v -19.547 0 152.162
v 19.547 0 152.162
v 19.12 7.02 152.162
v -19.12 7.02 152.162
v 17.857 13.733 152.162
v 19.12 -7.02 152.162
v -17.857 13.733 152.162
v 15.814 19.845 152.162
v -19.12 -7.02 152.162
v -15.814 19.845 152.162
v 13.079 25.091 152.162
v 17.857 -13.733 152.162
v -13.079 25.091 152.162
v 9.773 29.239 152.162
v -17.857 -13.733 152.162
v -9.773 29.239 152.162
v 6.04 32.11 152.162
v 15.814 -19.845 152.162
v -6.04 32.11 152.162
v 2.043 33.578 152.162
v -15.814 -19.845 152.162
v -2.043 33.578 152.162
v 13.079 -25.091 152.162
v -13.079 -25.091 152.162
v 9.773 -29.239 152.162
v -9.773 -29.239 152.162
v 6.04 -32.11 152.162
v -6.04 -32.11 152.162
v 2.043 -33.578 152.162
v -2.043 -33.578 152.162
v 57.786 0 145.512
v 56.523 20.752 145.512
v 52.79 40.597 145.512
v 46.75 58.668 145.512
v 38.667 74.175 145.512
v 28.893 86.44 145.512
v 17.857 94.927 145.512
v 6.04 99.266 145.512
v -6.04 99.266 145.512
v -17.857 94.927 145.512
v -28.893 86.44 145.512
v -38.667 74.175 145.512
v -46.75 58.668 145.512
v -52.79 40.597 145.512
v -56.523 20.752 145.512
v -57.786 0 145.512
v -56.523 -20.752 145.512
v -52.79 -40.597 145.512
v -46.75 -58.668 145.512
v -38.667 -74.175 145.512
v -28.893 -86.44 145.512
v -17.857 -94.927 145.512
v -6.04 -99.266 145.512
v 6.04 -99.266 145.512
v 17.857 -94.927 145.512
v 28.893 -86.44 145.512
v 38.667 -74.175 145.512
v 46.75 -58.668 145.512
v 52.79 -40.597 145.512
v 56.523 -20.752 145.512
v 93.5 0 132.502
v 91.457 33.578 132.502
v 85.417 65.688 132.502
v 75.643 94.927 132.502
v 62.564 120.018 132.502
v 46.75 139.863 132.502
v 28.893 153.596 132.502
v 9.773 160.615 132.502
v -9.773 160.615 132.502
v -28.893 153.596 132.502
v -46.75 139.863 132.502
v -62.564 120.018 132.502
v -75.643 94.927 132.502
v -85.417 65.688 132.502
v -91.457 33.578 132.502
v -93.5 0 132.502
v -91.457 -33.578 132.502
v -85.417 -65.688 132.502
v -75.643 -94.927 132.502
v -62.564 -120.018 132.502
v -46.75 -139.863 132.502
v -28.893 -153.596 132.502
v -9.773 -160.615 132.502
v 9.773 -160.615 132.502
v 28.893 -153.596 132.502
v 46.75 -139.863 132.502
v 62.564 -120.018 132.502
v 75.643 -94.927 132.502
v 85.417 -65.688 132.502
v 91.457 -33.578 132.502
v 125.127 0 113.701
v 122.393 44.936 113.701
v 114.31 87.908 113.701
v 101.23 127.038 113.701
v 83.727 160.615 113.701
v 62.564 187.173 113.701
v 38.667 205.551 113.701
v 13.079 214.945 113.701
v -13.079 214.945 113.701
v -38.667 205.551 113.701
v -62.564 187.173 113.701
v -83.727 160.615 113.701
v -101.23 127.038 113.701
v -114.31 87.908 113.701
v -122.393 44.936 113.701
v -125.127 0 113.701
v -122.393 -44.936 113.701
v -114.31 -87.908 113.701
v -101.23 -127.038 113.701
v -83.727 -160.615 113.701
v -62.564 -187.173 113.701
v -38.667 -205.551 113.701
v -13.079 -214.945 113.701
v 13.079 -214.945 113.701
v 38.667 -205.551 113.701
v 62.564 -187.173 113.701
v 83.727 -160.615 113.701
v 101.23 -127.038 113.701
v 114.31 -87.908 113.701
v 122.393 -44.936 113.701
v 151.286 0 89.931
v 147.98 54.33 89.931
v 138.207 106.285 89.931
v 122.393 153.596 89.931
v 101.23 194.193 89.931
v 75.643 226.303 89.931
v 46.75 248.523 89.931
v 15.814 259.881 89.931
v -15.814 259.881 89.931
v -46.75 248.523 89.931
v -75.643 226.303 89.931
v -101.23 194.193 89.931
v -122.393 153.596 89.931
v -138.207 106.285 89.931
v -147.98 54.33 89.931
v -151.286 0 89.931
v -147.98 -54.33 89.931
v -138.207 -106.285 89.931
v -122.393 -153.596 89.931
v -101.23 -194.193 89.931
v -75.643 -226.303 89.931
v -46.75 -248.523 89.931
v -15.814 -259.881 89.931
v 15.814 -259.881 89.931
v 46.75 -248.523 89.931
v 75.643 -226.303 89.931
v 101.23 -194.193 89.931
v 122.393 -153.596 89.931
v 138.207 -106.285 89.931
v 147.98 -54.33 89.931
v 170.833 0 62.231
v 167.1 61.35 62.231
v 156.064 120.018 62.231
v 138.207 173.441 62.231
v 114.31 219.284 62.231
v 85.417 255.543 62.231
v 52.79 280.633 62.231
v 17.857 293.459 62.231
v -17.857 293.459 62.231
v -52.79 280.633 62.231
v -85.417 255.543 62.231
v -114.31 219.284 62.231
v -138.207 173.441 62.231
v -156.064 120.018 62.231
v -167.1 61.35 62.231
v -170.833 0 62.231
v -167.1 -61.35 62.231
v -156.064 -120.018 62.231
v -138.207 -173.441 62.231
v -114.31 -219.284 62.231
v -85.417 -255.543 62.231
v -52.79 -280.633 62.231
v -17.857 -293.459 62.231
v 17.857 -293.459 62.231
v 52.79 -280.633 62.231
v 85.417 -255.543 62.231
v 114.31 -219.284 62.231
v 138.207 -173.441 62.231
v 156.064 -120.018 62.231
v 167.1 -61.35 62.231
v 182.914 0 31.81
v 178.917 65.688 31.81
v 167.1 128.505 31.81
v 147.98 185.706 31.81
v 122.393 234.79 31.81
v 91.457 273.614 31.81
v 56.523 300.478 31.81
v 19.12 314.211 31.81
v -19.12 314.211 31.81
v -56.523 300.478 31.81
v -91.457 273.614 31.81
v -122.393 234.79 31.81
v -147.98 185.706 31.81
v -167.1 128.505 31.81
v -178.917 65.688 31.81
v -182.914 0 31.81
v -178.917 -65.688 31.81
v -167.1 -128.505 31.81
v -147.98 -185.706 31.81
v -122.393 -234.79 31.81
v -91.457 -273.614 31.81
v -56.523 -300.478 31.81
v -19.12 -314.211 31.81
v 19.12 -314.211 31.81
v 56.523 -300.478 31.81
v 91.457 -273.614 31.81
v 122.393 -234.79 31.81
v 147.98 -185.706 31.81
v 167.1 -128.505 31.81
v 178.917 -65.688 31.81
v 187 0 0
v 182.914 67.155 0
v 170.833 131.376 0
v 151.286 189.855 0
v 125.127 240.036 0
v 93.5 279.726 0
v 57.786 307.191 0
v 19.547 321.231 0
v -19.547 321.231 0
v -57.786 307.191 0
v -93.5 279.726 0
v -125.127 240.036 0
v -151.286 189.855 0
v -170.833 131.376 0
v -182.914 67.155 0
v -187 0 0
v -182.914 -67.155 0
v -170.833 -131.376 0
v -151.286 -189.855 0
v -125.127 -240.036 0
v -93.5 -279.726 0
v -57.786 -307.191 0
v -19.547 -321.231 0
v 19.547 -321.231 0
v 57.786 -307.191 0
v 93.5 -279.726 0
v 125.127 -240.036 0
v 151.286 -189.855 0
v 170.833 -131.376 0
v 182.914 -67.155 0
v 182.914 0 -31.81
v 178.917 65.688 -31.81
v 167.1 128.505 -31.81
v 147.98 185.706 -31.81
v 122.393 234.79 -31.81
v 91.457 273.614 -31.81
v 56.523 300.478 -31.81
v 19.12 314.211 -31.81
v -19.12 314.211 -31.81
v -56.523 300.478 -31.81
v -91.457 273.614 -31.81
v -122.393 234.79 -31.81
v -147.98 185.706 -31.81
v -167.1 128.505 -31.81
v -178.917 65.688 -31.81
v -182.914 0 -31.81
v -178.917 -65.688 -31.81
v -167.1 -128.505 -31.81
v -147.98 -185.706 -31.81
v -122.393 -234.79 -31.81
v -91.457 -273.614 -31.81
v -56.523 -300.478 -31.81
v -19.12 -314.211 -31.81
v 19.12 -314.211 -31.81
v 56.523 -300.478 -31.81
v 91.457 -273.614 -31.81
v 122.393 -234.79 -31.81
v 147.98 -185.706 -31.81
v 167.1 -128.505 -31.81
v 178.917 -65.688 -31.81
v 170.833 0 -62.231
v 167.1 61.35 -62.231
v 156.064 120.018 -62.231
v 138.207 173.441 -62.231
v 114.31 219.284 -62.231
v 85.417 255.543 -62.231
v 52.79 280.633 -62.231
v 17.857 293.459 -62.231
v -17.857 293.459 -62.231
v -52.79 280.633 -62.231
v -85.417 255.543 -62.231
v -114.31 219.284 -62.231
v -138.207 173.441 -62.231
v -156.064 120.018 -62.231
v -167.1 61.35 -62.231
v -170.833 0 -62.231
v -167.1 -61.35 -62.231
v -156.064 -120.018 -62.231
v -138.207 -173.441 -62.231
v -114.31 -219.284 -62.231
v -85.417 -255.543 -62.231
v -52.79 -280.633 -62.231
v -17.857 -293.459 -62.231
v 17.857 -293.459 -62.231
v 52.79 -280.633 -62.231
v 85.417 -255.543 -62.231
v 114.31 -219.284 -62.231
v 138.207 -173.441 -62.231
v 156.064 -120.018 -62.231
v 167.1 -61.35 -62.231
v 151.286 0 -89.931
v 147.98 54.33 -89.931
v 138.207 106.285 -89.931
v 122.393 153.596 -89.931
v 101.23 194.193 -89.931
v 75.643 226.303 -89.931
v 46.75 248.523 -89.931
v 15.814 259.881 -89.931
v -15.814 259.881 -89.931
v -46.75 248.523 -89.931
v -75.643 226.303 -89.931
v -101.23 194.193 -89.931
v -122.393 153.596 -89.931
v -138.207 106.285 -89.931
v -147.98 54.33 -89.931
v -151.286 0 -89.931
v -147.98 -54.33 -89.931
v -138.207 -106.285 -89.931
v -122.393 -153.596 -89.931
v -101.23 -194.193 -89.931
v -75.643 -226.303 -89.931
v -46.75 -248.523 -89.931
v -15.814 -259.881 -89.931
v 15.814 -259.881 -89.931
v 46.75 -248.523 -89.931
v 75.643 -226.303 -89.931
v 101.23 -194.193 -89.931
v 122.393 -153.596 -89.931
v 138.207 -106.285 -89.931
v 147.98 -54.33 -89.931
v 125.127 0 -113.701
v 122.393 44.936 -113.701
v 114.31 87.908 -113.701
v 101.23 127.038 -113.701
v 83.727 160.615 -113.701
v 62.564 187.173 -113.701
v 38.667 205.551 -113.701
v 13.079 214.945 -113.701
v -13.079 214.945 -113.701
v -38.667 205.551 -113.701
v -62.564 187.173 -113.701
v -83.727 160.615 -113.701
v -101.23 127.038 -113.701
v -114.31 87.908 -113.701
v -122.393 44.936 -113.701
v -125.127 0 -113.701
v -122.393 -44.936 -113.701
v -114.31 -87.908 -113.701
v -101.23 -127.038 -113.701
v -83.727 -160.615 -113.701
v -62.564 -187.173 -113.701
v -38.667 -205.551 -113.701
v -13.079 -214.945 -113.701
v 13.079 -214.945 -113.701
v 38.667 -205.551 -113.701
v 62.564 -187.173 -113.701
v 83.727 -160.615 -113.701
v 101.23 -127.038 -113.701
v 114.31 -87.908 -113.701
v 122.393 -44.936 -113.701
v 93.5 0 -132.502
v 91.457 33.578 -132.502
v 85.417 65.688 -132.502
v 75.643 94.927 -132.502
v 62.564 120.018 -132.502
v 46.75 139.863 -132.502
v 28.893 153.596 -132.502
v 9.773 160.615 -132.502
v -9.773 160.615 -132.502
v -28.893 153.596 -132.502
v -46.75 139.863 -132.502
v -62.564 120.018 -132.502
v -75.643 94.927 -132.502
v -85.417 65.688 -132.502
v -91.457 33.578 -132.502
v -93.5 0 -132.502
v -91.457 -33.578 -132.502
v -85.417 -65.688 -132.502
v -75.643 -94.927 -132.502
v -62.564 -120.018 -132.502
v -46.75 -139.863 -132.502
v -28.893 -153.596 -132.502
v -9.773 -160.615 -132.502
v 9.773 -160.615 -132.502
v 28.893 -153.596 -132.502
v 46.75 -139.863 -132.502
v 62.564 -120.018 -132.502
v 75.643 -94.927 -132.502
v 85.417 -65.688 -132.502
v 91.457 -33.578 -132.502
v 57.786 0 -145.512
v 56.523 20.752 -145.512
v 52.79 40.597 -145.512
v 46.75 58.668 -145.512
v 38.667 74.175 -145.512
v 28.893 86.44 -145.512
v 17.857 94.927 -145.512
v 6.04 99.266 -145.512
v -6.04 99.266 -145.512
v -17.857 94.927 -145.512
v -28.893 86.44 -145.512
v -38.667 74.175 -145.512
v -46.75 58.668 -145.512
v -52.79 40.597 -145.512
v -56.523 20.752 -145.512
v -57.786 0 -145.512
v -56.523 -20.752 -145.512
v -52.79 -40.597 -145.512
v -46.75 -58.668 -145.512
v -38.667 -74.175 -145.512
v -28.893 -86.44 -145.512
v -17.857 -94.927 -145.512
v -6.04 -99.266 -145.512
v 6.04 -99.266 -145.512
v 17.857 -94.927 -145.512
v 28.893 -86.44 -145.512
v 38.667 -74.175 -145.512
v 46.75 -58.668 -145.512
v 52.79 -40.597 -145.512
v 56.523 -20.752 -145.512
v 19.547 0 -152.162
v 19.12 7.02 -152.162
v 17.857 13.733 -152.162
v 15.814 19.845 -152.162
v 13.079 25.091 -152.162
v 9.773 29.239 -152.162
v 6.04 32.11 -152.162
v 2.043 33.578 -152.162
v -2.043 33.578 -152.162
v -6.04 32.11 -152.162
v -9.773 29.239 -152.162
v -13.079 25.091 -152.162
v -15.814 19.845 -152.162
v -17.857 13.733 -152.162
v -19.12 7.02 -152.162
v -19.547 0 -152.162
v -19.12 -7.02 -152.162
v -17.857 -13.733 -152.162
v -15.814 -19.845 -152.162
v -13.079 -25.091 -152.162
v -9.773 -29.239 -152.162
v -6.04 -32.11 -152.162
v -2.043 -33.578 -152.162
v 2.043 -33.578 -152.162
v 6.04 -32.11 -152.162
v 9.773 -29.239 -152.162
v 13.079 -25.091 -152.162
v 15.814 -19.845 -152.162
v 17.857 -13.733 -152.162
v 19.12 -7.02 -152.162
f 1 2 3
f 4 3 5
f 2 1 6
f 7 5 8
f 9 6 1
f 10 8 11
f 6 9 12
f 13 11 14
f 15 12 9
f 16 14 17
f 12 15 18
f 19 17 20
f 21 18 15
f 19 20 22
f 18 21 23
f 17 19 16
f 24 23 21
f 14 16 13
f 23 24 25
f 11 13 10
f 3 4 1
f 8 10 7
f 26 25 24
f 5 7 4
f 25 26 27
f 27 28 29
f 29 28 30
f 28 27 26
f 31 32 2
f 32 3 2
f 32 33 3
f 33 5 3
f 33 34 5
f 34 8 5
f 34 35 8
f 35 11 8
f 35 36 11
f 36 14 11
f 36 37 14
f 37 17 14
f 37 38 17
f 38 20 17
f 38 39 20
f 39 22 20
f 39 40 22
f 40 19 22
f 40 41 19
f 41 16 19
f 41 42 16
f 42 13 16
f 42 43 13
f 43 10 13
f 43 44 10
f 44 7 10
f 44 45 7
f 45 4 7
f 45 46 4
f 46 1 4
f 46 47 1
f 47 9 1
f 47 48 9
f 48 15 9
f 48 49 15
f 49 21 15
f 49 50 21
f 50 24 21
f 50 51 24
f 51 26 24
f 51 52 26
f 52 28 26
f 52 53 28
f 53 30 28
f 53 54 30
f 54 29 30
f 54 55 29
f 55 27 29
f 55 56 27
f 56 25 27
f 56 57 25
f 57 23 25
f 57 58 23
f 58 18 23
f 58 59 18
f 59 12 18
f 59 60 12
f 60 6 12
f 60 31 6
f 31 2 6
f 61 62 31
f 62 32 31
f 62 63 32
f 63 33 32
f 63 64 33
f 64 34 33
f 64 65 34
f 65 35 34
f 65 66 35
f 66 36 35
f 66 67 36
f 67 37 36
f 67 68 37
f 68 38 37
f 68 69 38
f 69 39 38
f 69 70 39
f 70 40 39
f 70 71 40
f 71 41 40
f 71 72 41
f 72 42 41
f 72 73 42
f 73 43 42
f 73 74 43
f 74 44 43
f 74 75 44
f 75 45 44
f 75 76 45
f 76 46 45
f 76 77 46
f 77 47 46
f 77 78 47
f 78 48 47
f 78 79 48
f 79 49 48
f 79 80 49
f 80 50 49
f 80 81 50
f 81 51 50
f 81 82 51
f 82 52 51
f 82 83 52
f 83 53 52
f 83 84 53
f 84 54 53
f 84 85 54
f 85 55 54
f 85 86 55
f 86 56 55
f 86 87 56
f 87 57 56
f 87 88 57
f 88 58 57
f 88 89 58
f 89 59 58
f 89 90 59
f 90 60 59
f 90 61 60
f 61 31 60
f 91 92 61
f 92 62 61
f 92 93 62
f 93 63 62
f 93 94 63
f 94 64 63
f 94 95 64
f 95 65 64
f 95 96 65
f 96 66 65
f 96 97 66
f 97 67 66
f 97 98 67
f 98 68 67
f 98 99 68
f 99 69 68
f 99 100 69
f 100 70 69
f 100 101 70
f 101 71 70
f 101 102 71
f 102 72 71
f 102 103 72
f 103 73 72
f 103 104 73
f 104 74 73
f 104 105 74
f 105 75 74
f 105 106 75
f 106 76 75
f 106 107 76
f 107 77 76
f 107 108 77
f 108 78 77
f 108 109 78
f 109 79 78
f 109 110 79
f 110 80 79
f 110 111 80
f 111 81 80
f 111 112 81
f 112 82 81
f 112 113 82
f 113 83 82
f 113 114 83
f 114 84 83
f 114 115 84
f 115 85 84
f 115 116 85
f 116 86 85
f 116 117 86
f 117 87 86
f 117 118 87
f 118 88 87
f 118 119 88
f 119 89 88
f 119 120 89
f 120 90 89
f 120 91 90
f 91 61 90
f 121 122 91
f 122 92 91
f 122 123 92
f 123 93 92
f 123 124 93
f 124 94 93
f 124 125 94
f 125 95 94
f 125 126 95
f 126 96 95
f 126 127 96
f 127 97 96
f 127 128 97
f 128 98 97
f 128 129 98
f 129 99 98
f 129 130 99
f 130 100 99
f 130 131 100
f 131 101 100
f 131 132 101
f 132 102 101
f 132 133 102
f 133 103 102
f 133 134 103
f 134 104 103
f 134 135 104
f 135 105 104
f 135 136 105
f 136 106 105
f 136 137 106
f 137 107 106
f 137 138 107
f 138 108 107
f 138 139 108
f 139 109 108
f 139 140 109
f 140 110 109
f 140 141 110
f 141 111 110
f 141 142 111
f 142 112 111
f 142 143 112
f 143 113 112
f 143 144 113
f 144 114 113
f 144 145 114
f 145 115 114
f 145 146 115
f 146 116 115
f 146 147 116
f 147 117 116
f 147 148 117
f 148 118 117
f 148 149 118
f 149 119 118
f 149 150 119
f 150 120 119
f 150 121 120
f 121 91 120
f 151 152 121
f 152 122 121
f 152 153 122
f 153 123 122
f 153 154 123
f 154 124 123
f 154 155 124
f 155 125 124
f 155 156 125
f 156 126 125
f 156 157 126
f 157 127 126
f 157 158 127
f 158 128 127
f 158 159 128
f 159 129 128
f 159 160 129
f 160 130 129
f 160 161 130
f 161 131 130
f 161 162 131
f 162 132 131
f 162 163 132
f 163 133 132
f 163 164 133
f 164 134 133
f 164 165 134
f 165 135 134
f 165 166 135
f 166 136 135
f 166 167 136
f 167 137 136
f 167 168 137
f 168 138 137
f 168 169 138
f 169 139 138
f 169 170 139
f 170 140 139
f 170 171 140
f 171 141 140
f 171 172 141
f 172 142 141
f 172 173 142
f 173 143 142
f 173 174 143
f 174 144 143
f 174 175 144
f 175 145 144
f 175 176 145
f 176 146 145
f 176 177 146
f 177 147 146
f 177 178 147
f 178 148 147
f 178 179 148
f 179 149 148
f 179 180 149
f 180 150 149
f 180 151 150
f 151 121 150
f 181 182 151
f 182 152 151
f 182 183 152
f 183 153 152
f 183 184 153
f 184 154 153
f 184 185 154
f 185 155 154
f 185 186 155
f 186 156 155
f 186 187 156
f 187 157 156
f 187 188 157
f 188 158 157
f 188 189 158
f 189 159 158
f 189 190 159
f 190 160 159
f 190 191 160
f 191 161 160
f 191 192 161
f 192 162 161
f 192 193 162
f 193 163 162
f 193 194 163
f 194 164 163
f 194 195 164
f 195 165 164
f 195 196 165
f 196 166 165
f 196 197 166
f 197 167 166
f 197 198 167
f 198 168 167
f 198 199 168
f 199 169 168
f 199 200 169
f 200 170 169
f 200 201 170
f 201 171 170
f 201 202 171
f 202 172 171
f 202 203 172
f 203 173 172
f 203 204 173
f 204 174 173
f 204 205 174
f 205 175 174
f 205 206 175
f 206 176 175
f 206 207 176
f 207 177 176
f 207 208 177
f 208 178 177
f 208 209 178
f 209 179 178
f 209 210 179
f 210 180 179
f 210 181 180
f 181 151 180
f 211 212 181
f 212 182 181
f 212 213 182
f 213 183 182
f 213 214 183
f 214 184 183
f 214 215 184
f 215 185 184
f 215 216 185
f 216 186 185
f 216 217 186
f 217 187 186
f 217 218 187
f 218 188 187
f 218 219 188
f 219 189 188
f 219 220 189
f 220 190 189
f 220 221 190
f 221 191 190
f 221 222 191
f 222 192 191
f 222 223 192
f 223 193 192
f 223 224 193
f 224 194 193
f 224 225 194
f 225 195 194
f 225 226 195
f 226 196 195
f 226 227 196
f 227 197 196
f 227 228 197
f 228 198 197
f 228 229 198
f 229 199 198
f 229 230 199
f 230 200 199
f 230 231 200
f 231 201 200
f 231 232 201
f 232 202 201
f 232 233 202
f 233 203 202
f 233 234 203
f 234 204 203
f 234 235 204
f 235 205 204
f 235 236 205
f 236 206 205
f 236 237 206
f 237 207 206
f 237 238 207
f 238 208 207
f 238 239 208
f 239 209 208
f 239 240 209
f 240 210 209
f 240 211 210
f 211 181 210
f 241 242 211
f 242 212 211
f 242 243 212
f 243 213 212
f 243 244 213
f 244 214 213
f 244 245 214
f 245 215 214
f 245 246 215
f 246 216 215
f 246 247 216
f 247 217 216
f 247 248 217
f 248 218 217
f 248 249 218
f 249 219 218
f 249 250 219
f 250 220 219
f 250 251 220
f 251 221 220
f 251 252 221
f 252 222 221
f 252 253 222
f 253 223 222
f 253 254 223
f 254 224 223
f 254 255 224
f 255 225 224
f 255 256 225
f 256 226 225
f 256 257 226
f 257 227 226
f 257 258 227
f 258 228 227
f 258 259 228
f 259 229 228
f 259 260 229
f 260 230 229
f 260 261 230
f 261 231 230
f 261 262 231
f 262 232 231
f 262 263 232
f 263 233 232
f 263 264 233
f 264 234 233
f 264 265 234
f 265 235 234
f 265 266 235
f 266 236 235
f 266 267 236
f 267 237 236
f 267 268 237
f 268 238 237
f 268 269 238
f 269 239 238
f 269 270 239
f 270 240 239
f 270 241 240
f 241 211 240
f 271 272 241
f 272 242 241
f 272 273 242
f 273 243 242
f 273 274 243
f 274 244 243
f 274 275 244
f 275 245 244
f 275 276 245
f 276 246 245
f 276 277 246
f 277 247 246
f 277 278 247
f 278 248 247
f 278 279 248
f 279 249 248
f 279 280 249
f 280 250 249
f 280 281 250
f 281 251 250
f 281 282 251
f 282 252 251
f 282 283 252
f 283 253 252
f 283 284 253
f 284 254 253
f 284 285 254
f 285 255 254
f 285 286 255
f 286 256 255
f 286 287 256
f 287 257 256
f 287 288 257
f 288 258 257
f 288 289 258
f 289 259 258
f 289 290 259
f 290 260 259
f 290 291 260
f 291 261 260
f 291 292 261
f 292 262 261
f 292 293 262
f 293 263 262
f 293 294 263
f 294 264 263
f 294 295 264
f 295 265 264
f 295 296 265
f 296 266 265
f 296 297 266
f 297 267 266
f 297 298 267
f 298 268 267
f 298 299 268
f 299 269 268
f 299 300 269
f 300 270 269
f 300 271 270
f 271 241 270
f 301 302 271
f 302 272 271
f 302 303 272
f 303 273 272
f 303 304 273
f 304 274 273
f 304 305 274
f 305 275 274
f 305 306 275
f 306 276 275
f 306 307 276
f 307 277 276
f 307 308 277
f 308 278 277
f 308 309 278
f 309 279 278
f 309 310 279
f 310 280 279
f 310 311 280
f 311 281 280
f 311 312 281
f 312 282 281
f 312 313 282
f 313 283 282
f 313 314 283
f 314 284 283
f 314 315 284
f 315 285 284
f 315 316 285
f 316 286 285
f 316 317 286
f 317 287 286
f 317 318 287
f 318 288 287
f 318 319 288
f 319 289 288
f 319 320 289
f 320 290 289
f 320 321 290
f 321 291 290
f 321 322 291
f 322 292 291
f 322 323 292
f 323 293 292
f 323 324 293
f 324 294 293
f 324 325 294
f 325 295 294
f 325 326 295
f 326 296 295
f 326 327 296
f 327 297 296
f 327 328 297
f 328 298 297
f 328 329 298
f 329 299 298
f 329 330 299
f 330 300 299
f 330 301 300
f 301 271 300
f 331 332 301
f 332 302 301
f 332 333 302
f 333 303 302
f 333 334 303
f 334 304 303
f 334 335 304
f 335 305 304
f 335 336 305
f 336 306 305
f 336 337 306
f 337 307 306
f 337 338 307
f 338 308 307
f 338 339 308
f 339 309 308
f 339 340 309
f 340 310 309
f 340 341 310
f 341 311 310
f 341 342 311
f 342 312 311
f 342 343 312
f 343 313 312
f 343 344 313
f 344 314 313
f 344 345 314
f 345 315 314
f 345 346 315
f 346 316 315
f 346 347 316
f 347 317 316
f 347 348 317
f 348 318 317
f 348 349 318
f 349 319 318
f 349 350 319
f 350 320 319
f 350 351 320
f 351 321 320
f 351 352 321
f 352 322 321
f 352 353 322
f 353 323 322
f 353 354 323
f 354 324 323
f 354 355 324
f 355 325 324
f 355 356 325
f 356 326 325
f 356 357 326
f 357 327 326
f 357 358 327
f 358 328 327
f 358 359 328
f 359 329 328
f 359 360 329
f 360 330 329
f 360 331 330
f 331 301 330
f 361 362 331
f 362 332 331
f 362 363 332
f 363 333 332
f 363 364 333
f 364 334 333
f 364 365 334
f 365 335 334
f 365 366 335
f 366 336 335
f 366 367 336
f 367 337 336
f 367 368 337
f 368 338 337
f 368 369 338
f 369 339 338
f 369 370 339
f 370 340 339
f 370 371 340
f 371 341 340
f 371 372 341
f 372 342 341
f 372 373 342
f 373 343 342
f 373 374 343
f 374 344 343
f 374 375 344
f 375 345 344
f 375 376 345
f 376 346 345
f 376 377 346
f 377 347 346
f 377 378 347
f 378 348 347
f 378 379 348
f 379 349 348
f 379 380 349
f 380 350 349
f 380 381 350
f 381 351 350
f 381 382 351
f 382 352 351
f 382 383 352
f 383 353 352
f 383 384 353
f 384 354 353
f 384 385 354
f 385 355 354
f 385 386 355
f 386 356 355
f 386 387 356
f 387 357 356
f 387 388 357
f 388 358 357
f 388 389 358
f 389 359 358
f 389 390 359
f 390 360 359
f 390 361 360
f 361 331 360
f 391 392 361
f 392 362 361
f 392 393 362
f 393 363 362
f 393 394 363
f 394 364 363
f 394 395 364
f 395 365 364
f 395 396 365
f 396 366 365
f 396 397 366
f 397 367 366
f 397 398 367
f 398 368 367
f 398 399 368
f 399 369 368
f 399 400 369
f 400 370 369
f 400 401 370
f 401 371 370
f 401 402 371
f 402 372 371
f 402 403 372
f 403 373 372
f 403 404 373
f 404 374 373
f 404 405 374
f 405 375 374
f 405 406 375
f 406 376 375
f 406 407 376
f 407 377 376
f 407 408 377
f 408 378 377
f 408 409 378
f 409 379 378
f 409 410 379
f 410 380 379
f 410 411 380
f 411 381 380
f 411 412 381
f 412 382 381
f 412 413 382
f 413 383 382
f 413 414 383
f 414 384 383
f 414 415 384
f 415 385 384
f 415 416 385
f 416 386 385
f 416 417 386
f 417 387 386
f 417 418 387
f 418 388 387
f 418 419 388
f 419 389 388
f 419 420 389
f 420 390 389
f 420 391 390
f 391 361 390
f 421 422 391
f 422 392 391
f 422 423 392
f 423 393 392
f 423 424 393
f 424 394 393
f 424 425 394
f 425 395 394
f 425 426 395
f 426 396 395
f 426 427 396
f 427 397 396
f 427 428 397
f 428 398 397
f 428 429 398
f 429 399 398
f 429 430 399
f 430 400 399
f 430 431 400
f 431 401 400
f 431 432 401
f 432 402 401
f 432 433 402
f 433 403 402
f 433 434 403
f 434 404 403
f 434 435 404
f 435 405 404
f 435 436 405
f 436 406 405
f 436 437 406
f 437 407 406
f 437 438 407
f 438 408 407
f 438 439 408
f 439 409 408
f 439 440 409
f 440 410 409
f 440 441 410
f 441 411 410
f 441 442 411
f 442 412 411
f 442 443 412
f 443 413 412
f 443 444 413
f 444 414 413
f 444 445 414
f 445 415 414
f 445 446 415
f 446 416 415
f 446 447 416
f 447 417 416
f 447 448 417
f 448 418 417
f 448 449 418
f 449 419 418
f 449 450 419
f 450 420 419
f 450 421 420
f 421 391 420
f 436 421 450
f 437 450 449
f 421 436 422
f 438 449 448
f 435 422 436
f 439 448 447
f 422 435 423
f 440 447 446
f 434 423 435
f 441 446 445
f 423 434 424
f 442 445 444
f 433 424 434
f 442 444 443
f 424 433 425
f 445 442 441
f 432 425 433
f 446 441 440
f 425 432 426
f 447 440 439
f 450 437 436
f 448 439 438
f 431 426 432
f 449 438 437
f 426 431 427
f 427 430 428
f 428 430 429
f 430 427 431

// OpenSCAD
// Generated by SolidPython 1.0.1 on 2020-07-29 00:46:50


scale(v = [11, 19, 9]) {
	sphere(r = 17);
}
/***********************************************
*********      SolidPython code:      **********
************************************************
 
# import packages: SolidPython
from solid import *
from solid.utils import *
from itertools import chain, combinations, permutations


class Resize:

    def __init__(self, scad_file):
        self.scad_file = scad_file
        #self.scad_file = import_scad(scad_file)
        # cone/cylinder param:
        self.r1 = 0
        self.r2 = 0
        self.h = 0
        # rectangular prism param:
        self.w = 0
        self.l = 0
        # ellipse param:
        self.r = 0

    # import OpenScad code (file name corresponds to shape)


    # classify shape + parameters
    def assign(self, param1, param2, param3):
        if self.scad_file == 'cone.scad':
            self.r1 = param1
            self.r2 = param2
            self.h = param3
        elif self.scad_file == 'cylinder.scad':
            self.r1 = param1
            self.r2 = param2
            self.h = param3
        elif self.scad_file == 'rectangularPrism.scad':
            self.h = param1
            self.l = param2
            self.w = param3
        else:
            self.r = param1
            self.h = param2

    # resize parameters
    def iterate(self):
        x = range(3, 20, 2)
        i = 1
        if self.scad_file == 'cone.scad':
            tempList = list(permutations(x, 2))
            for temp in tempList:
                param1 = temp[0]
                param2 = temp[1]
                filepath = 'produced_scad_files/' + 'cone' + str(param1) + '_' + str(param2) + '_' + '.scad'
                scad_render_to_file(cylinder(h=param1, r1=param2, r2=0), filepath)

        elif self.scad_file == 'cylinder.scad':
            tempList = list(permutations(x, 3))
            for temp in tempList:
                param1 = temp[0]
                param2 = temp[1]
                filepath = 'produced_scad_files/' + 'cylinder' + str(param1) + '_' + str(param2) + '_' + '.scad'
                scad_render_to_file(cylinder(h=param1, r1=param2, r2=param2), filepath)

        elif self.scad_file == 'rectangularPrism.scad':
            tempList = list(permutations(x, 3))
            for temp in tempList:
                param1 = temp[0]
                param2 = temp[1]
                param3 = temp[2]
                filepath = 'produced_scad_files/' + 'rectangularPrism' + str(param1) + '_' + str(param2) + '_' + str(
                    param3) + '.scad'
                scad_render_to_file(cube(size=(param1, param2, param3)), filepath)

        elif self.scad_file == 'ellipse.scad':
            tempList = list(permutations(x, 4))
            for temp in tempList:
                param1 = temp[0]
                param2 = temp[1]
                param3 = temp[2]
                param4 = temp[3]
                filepath = 'produced_scad_files/' + 'ellipse' + str(param1) + '_' + str(param2) + '_' + str(param3) + '_' + str(param4) + '.scad'
                scad_render_to_file(scale([param1, param2, param3])(sphere(r=param4)), filepath)

    def render_to_scadfile(self):
        scad_render_to_file(scad, 'example.scad') 
 
************************************************/
